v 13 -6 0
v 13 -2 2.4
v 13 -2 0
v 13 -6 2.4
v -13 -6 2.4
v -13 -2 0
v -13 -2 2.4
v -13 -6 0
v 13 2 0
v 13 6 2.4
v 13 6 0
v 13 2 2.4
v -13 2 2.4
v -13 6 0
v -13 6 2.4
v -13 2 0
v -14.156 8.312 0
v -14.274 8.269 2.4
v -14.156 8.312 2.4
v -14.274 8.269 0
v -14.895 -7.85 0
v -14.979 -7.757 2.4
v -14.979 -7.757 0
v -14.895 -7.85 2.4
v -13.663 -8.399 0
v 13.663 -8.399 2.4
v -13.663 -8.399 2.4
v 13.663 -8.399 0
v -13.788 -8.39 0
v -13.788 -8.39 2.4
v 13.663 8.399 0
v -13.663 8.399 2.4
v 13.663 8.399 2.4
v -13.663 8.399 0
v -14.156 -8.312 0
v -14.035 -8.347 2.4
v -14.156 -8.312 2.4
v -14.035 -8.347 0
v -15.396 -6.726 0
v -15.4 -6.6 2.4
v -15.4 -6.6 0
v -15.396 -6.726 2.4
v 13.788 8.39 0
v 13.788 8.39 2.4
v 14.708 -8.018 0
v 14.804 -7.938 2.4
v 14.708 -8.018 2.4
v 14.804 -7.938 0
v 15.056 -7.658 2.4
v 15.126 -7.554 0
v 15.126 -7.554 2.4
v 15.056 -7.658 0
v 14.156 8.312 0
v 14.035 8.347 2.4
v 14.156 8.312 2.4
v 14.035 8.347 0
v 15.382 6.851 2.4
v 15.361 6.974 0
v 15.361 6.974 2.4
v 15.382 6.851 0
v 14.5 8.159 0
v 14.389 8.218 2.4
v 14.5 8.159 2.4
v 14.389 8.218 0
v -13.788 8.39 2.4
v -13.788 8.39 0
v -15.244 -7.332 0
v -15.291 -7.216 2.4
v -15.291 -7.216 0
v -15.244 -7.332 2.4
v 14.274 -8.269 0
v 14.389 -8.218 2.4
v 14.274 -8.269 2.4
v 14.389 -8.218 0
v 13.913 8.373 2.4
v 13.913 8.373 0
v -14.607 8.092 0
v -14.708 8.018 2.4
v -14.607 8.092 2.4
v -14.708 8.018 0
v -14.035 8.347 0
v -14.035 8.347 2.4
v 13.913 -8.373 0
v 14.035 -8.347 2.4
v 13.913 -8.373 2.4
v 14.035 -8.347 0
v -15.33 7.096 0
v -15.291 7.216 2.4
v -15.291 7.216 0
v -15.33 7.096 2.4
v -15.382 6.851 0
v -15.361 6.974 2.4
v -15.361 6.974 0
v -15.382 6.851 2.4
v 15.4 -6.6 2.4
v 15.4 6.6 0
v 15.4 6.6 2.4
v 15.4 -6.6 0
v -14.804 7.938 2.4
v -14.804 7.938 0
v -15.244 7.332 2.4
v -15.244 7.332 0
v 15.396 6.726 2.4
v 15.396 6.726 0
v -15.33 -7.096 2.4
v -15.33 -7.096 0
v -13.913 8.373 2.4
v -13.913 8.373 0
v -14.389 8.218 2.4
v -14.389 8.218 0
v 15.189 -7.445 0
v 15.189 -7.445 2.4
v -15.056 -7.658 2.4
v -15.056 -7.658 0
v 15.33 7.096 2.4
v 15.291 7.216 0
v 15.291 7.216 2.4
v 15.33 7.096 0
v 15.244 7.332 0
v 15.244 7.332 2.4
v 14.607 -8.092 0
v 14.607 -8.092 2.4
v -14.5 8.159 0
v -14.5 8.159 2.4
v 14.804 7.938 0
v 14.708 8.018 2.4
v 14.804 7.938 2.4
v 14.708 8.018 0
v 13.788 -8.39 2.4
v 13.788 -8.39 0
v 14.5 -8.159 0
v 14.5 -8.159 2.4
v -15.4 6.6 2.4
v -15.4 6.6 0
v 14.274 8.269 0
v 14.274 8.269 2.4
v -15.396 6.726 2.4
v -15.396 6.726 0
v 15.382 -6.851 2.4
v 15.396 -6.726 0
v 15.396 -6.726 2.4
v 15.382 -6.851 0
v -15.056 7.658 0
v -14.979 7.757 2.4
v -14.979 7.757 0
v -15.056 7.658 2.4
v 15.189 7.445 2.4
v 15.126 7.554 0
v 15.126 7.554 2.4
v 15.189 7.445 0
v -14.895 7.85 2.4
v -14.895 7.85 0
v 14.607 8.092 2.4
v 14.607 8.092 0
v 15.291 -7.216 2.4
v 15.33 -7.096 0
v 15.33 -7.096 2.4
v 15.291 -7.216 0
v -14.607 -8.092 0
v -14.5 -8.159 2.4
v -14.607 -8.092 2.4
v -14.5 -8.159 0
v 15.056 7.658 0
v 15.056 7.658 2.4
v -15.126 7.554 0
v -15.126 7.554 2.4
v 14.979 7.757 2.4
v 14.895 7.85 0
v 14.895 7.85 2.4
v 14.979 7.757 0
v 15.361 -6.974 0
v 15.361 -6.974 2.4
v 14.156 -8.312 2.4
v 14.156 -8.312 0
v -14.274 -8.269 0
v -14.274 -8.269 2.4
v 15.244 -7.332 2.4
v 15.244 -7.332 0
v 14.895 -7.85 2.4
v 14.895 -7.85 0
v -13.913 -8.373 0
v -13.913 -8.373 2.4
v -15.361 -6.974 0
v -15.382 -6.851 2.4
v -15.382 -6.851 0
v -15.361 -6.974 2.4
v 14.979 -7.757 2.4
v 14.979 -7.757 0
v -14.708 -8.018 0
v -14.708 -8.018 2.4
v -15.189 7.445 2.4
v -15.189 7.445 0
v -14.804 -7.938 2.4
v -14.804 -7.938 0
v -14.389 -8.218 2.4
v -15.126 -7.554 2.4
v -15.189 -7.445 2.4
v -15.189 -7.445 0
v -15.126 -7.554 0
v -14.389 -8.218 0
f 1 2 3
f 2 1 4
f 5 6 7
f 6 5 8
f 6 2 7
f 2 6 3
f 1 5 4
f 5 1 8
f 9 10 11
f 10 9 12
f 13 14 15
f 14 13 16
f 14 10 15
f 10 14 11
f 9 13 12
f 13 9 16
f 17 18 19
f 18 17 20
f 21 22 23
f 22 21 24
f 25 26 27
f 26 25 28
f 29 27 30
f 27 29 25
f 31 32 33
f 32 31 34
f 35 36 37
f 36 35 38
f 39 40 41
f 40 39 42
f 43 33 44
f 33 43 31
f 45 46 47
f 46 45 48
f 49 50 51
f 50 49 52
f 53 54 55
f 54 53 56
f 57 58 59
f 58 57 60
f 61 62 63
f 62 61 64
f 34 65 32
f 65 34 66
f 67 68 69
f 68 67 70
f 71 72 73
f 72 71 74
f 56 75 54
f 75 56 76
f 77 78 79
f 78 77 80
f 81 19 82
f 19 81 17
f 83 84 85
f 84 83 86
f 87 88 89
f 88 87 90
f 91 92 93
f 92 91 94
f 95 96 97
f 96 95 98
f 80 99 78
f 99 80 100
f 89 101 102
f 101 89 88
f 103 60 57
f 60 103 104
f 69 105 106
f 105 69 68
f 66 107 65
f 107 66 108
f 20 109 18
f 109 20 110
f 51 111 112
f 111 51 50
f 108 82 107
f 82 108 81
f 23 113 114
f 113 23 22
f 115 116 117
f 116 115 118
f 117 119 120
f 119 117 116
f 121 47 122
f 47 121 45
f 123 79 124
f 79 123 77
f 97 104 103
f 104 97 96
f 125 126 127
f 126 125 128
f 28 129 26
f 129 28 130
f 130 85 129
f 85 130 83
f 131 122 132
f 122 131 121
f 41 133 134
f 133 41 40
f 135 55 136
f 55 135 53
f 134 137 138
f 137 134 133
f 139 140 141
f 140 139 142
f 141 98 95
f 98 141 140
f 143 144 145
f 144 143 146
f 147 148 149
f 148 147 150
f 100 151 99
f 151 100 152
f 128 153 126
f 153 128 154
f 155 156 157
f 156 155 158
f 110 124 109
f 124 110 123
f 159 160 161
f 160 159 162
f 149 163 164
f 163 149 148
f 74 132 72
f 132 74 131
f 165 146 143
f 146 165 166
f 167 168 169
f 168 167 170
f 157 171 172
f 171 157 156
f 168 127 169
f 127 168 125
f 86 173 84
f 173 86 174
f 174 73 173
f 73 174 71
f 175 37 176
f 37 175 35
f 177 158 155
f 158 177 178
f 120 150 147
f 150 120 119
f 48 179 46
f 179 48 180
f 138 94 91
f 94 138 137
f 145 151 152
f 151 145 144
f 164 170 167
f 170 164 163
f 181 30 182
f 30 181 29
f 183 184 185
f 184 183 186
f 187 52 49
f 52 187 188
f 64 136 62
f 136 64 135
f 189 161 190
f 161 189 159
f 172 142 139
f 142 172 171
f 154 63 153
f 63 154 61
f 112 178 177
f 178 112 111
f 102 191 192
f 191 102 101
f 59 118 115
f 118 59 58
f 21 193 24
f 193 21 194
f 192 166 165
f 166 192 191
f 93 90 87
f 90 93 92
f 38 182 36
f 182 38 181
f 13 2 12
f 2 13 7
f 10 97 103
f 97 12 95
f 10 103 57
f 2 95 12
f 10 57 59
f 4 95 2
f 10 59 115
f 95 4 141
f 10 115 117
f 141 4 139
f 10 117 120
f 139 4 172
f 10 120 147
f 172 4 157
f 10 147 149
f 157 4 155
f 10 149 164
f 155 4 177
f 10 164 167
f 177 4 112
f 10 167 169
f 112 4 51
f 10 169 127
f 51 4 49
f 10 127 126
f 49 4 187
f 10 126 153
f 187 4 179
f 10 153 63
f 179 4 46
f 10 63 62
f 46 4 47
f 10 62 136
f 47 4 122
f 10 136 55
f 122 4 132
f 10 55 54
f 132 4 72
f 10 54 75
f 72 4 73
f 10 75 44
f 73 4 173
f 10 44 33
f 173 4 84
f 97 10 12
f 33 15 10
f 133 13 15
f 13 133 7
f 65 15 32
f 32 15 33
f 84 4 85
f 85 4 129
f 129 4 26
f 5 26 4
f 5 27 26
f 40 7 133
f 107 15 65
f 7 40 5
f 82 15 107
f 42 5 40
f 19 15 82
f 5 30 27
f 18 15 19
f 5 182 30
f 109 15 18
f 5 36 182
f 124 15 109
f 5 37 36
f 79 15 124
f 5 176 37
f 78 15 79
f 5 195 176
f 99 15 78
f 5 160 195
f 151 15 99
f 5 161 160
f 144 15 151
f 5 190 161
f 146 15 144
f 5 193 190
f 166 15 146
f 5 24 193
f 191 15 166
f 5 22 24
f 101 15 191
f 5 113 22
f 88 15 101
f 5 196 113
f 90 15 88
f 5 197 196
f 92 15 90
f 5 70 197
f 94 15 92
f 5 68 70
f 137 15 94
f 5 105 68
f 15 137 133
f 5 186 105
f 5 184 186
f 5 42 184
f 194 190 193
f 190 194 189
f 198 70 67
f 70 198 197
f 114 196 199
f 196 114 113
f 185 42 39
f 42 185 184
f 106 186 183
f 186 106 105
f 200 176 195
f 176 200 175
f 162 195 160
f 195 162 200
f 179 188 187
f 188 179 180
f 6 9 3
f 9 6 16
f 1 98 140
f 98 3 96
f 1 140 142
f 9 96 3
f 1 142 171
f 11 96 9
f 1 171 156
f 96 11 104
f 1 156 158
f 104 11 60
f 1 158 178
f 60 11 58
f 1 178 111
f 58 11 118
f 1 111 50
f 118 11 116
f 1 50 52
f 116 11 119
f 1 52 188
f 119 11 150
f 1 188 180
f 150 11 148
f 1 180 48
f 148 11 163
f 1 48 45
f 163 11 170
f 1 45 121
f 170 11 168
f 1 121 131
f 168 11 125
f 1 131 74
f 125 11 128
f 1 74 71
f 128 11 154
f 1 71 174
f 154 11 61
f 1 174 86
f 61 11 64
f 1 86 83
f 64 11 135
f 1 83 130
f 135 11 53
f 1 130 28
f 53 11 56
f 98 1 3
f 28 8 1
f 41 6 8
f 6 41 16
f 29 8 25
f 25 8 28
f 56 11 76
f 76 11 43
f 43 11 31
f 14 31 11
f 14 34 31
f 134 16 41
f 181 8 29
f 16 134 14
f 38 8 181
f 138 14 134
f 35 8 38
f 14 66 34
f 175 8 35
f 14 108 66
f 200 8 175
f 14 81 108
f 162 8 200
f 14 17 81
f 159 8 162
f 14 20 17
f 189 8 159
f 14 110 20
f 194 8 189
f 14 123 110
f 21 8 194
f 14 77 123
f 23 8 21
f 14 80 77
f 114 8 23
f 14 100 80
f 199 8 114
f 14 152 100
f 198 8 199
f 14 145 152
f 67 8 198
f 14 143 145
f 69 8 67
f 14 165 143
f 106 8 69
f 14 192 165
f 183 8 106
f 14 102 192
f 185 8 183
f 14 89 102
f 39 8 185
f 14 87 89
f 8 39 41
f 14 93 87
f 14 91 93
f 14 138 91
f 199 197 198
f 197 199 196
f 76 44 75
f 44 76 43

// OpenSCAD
// [FL_INDEX: keywords="openscad, 3d_parametric, Customizable_Tri_Glide, csg_solid" | COT="Parametric OpenSCAD design from 3DCodeverse"]
// Title:  Customizable Tri Glide

//=== Flat Tri Glide ===//

//width of the webbing opening (1in = 25.4 mm)
_1_webbingWidth = 26;

// width of the gap for the webbing
_2_webbingGap = 4;

// thickness of the edge
_3_edgeThickness = 2.4;

// thickness of the center beam
_4_centerThickness = 4;

// height of the tri glide
_5_height = 2.4;

// percent corner rounding
_6_cornerRounding = 75; // [1:100]


module makeBody(xsize, ysize, height, radius) {
	translate([0,0,height/2]) {
		minkowski() {
			cube(size=[xsize-2*radius,ysize-2*radius, height/2], center = true);
			cylinder(r=radius, h=height/2, center=true);
		}
	}
}

module makeCuts(width, gap, thickness, height) {
	offset = (thickness+gap)/2;
	for (y = [-offset, offset]) {
		translate([0, y, height/2]) {
			cube(size=[width, gap, height*2], center=true);
		}
	}
}

module makeTriGlide(width, gap, edgeThickness, centerThickness, height, rounding, $fn=90) {
	xsize = width + edgeThickness * 2;
	ysize = centerThickness + edgeThickness * 2 + gap * 2;
	radius = edgeThickness*(rounding/100);
	difference() {
		makeBody(xsize, ysize, height, radius);
		makeCuts(width, gap, centerThickness, height);
	}
}

makeTriGlide(_1_webbingWidth, _2_webbingGap, _3_edgeThickness, _4_centerThickness, _5_height, _6_cornerRounding);
